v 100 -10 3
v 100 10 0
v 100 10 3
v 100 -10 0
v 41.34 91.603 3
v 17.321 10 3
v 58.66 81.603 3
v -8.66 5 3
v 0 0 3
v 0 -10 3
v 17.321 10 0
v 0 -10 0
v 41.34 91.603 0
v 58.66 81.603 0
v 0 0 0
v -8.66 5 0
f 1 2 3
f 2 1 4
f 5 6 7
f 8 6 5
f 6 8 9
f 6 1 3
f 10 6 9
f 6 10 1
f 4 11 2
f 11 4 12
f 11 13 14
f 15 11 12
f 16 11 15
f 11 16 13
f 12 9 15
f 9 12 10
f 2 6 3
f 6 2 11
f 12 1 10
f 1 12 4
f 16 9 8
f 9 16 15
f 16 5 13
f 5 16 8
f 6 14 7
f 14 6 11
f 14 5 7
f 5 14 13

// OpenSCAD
degrees = 60;
arm_length = 100;
arm_width = 20;
thickness = 3;

translate([0, -arm_width/2, 0]) {
    cube([arm_length, arm_width, thickness]);
}

rotate([0, 0, degrees]) {
    translate([0, -arm_width/2, 0]) {
        cube([arm_length, arm_width, thickness]);
    }
}
